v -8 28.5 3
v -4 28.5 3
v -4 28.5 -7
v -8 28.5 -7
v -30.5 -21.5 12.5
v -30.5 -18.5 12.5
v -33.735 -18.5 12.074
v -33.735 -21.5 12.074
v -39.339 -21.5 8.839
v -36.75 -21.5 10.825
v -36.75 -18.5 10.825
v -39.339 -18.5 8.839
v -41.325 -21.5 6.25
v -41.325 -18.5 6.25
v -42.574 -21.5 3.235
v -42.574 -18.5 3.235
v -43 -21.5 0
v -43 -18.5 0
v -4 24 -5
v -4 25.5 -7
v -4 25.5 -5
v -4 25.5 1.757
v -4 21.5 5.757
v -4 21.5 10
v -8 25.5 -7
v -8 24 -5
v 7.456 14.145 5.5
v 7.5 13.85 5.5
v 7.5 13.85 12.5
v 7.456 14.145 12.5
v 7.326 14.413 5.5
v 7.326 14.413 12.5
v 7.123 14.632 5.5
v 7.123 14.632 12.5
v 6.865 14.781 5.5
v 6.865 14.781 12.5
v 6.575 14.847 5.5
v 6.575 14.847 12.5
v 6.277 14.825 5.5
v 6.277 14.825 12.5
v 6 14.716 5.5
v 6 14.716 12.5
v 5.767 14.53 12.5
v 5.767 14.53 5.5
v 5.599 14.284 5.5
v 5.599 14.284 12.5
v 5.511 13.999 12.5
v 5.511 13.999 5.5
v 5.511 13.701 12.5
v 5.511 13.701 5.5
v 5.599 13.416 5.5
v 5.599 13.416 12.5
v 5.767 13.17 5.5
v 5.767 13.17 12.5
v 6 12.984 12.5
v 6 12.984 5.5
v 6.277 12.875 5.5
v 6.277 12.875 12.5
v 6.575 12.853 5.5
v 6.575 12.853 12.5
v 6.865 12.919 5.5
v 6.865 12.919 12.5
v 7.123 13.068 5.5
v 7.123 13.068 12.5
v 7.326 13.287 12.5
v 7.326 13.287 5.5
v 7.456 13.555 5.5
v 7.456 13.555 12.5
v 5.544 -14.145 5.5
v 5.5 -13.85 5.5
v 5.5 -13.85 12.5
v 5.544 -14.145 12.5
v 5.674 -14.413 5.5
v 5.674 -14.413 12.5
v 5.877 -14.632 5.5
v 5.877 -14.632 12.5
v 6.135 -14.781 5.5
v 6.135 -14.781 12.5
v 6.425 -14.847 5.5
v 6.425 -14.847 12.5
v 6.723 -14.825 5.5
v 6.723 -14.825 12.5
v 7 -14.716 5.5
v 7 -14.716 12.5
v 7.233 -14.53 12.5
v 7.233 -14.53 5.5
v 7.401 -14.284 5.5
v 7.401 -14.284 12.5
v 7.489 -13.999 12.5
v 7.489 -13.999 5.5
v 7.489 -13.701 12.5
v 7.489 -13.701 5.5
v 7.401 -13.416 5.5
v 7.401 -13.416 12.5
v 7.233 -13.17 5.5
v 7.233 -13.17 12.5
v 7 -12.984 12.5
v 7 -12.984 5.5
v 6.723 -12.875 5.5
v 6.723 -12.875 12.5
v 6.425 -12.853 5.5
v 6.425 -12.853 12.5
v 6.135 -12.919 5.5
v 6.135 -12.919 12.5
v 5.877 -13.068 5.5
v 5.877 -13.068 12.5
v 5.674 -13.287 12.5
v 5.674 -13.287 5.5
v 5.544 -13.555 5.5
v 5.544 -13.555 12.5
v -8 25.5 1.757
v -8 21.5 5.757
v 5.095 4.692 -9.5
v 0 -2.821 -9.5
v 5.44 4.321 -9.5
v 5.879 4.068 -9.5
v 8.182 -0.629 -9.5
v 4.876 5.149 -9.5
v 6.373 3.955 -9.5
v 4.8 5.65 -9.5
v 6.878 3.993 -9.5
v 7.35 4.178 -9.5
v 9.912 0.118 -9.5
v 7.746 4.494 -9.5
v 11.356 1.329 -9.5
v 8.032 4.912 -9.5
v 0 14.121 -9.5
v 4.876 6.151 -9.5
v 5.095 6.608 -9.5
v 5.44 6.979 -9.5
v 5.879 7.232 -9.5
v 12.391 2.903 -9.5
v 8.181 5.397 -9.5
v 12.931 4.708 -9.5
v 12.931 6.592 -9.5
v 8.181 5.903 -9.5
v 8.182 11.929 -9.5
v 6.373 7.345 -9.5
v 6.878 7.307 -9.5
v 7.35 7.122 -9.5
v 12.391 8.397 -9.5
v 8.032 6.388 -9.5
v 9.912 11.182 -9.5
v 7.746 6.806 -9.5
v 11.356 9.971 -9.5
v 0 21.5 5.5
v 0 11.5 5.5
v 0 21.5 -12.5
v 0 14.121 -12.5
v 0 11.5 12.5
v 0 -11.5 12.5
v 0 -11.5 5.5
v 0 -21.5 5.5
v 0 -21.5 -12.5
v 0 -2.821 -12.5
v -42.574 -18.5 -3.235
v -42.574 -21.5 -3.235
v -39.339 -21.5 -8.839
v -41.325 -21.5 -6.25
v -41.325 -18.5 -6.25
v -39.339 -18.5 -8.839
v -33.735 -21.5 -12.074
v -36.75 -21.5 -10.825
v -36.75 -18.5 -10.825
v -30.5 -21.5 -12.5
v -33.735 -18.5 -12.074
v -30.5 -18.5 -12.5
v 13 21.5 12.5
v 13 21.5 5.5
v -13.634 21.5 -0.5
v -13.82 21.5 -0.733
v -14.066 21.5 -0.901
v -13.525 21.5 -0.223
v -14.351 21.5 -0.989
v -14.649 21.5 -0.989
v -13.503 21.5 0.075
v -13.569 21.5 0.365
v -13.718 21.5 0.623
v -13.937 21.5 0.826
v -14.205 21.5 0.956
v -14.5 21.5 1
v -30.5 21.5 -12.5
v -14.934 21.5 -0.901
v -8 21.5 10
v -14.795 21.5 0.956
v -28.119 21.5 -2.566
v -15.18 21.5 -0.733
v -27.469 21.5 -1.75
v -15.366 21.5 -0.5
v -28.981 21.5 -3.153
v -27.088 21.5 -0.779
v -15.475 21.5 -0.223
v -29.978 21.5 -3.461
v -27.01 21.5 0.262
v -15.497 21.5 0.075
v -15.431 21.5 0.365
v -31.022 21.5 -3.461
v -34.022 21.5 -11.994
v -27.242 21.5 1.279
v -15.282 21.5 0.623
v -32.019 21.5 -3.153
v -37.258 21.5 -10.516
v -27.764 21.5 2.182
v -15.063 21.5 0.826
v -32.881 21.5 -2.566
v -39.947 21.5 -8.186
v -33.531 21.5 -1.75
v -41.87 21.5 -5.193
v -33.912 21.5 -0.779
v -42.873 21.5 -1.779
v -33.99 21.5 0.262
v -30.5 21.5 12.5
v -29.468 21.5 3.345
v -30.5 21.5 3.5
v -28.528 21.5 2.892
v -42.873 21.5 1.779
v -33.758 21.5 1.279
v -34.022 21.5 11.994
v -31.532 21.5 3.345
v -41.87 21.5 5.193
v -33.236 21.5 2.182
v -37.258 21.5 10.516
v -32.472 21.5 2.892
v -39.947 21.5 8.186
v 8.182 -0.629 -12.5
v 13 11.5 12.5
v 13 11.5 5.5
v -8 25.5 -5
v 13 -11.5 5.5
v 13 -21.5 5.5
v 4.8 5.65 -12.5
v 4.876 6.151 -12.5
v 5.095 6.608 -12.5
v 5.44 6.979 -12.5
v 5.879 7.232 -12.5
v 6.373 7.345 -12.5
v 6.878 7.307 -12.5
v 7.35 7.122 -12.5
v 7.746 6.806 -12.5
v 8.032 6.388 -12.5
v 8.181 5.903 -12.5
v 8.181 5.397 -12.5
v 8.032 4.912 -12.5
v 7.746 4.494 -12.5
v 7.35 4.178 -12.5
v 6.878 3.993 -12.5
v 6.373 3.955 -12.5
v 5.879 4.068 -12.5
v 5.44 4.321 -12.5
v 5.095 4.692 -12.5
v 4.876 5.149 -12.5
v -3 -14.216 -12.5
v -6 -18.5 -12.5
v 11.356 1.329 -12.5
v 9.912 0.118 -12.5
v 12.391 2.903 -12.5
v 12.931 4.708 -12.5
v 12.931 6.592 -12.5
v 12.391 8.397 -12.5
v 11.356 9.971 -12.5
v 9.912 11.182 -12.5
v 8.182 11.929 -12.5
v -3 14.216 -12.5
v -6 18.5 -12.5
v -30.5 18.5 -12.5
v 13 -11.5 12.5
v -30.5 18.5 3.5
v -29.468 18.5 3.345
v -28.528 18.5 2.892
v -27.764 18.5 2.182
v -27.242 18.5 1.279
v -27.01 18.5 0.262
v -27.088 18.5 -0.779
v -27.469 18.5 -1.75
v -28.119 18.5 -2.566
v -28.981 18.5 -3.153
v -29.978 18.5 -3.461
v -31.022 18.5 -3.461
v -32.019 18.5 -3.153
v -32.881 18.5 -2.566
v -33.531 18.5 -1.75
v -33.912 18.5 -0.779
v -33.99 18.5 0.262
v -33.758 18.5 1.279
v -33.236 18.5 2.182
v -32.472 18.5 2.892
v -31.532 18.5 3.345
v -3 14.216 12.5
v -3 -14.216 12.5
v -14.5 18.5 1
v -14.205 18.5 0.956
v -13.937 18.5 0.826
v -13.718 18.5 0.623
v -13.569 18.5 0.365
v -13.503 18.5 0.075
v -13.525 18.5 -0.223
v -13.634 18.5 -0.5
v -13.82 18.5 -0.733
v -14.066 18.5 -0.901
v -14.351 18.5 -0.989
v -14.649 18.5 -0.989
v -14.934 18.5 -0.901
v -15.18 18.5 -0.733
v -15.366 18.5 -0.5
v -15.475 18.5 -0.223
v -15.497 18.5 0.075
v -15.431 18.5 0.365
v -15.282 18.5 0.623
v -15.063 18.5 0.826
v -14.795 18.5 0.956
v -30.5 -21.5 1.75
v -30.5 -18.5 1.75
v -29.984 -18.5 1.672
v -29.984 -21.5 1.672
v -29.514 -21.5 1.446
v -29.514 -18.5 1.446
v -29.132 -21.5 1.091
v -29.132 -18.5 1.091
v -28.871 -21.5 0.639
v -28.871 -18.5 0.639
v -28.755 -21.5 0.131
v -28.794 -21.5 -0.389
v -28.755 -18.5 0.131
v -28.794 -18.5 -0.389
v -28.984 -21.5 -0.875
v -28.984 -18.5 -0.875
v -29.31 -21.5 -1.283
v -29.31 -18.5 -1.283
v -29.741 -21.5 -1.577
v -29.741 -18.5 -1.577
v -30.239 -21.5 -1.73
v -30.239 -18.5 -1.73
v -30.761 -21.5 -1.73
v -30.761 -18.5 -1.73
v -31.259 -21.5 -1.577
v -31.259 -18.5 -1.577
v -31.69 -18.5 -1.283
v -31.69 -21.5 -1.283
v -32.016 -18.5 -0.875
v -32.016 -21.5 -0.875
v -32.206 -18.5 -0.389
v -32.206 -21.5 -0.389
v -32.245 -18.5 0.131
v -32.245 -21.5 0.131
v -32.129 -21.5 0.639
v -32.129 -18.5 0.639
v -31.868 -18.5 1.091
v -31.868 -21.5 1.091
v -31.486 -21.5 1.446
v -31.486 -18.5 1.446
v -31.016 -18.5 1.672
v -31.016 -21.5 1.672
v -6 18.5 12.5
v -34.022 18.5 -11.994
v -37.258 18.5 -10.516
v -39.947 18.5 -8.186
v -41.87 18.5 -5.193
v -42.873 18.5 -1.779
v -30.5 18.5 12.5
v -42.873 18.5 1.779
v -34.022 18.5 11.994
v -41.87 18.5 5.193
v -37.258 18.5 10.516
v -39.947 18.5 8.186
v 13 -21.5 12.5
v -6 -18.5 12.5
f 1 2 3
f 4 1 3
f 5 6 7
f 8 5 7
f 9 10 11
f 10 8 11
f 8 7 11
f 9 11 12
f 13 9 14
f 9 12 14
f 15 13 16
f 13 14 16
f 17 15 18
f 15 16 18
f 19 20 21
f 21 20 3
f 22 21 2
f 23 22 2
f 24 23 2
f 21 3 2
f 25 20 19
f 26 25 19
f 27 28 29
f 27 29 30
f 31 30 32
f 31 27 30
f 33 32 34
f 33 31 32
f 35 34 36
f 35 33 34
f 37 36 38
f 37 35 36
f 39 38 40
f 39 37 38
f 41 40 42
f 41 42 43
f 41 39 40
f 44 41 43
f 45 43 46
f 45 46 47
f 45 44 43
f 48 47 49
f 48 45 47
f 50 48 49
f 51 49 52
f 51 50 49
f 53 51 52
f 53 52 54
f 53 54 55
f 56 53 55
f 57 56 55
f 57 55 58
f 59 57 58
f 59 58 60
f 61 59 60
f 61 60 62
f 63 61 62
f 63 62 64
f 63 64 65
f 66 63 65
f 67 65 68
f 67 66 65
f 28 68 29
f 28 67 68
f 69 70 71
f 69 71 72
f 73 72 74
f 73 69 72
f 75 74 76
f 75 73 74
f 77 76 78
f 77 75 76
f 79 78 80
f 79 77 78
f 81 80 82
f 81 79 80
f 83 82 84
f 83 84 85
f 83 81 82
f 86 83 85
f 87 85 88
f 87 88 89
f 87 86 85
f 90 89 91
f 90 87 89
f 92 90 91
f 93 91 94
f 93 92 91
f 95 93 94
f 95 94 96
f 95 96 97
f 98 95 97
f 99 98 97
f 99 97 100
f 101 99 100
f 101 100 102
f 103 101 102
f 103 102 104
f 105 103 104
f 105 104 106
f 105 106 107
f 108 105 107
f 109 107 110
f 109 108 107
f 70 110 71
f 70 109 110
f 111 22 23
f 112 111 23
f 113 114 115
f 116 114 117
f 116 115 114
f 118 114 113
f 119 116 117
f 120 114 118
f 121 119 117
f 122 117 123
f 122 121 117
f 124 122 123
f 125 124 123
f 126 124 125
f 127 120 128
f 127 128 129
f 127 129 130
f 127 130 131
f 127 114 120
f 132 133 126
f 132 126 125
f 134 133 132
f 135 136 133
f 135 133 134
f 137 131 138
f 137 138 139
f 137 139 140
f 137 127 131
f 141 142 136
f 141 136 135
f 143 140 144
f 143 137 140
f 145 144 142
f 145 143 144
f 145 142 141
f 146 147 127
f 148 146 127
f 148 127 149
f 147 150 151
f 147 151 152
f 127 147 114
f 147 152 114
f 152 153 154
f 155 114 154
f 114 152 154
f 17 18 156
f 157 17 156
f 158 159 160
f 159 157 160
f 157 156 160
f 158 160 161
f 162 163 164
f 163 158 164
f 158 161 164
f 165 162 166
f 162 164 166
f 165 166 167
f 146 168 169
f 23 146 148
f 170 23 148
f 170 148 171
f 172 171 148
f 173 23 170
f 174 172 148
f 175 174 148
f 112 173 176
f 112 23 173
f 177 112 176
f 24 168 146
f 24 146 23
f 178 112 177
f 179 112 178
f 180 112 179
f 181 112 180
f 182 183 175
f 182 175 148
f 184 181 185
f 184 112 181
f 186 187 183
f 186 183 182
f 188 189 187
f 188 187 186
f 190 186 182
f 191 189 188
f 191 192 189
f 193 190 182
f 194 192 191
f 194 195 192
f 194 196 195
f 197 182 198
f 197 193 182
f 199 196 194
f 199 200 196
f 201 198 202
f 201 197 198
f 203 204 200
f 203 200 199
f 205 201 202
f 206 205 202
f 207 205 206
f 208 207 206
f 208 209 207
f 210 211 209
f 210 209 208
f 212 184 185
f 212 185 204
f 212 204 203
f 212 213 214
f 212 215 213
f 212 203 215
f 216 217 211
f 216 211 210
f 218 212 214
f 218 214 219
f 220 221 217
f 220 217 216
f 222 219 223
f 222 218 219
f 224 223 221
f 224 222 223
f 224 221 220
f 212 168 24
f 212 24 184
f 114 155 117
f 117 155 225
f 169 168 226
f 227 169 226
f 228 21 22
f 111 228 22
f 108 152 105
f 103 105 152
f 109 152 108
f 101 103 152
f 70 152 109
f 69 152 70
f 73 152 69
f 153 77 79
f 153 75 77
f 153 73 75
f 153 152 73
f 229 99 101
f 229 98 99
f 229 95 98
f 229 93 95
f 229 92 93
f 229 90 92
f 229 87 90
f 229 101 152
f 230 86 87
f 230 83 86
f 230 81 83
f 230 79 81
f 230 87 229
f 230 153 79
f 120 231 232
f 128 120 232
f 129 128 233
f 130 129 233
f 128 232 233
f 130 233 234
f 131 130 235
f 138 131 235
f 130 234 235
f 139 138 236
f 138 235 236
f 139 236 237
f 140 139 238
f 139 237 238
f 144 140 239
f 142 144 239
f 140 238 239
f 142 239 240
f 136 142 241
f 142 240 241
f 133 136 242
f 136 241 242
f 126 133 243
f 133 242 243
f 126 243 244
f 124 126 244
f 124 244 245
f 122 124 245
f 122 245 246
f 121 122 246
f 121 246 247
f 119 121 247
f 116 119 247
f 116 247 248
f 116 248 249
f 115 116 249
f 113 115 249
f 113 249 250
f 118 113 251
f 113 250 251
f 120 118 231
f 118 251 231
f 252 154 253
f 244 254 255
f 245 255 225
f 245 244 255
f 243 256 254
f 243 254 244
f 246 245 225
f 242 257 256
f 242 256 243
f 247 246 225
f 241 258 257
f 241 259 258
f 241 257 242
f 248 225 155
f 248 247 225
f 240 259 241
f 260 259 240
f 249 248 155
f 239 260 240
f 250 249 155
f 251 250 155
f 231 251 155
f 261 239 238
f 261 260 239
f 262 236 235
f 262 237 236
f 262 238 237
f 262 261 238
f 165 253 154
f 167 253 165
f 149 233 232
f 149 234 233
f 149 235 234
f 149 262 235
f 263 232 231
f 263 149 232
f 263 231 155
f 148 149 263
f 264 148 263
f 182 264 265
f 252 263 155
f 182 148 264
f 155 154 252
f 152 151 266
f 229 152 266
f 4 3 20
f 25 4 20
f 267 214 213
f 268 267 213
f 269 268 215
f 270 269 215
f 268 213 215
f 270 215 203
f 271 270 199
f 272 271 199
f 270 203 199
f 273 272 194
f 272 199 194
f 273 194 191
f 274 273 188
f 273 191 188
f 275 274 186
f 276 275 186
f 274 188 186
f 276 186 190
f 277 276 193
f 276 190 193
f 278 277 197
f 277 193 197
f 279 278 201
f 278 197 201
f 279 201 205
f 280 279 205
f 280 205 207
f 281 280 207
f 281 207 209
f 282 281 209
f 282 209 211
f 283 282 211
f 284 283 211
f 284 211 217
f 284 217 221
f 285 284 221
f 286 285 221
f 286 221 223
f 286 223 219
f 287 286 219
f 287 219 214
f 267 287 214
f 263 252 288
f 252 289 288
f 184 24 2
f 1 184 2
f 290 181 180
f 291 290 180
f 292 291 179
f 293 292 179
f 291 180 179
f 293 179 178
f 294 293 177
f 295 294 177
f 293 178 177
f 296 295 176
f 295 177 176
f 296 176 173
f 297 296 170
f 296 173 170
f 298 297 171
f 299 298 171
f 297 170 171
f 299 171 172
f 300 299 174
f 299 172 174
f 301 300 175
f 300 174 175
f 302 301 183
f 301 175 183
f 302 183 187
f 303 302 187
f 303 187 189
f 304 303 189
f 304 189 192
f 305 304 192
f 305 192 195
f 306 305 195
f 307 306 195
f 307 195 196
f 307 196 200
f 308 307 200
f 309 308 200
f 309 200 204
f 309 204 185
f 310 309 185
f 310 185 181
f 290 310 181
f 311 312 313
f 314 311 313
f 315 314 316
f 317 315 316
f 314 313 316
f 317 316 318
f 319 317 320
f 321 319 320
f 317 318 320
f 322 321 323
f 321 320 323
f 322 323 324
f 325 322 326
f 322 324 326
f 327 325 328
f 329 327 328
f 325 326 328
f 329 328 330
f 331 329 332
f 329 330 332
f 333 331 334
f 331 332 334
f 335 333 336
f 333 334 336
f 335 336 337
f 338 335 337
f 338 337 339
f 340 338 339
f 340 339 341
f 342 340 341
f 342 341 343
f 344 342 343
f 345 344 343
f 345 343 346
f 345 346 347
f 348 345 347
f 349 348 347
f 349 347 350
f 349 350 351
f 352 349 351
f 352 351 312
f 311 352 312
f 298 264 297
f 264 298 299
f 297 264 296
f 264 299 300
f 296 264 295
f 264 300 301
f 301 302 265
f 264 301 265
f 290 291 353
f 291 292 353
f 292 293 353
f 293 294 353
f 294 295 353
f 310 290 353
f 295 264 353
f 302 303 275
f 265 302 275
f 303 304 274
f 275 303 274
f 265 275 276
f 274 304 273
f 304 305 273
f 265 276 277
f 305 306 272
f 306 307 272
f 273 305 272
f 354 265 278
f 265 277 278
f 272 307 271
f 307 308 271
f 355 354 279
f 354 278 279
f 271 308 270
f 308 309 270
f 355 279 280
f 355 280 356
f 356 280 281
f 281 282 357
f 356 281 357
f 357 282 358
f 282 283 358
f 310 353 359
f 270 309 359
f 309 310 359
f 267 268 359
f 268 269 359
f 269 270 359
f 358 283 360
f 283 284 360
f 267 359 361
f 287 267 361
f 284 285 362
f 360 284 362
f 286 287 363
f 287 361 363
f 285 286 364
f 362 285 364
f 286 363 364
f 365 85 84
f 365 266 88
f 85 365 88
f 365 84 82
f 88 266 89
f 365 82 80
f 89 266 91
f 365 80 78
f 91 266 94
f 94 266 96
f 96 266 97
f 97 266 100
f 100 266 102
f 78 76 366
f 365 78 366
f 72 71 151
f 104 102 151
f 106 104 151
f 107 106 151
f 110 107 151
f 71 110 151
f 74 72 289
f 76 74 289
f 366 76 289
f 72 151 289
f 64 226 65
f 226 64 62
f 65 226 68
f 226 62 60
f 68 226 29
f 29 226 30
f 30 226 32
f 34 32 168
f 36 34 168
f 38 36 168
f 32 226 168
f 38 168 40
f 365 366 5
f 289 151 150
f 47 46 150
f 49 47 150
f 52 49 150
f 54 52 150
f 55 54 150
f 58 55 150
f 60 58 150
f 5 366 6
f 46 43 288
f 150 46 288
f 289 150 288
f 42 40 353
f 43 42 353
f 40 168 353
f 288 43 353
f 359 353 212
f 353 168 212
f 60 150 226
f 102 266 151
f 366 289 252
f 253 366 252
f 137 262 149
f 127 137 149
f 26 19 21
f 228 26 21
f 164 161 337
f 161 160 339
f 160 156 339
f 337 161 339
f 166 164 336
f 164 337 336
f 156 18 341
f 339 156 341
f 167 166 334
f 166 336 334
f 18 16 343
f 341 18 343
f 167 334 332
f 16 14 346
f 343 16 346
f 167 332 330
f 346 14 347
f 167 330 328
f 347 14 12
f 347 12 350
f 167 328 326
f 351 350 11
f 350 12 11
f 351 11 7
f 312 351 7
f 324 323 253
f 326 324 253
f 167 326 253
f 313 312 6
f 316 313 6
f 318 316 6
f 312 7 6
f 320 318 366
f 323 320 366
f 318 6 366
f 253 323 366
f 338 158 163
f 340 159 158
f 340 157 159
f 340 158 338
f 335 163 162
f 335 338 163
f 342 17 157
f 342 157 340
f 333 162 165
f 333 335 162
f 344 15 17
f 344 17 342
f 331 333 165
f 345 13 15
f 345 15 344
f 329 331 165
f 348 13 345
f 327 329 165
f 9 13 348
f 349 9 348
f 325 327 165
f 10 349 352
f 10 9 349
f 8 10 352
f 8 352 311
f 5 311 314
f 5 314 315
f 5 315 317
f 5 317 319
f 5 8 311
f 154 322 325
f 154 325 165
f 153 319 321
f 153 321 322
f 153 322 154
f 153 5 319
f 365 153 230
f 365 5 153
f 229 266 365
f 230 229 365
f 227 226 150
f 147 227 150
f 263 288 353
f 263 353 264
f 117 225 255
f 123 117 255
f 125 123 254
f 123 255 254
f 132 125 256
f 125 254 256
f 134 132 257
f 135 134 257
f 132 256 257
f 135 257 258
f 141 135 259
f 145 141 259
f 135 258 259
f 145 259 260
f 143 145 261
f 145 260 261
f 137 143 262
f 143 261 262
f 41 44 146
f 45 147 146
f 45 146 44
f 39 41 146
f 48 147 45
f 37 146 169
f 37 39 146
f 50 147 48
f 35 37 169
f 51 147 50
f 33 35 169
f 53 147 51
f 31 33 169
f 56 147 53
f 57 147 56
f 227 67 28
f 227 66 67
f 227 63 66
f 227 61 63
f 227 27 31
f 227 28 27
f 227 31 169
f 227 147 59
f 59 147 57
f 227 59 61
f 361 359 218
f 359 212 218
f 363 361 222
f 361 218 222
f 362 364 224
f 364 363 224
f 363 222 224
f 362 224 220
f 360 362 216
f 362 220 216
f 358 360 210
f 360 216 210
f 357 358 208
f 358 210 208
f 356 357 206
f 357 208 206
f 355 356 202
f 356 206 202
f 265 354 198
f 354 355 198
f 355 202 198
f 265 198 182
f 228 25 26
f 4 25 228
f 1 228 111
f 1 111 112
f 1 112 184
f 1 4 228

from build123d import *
from OCP.BRepFilletAPI import BRepFilletAPI_MakeChamfer

# Parameters (mm, degrees)
ESBO_O1_R                  = 1
RESSALTO_EXTRUS_O1_DEPTH   = 12.5
ESBO_O2_R                  = 3.5
ESBO_O2_R_2                = 1
CORTE_EXTRUS_O1_DEPTH      = 15
CORTE_EXTRUS_O2_DEPTH      = 56.625983137
CORTE_EXTRUS_O2_DEPTH_BACK = 56.625983137
ESBO_O4_W                  = 13
ESBO_O4_H                  = 18
ESBO_O5_R                  = 1.7
RESSALTO_EXTRUS_O2_DEPTH   = 3
CHANFRO1_SIZE              = 3
CHANFRO1_SIZE2             = 4.28444402
ESBO_O7_R                  = 1.75
CORTE_EXTRUS_O3_DEPTH      = 10
CORTE_EXTRUS_O4_DEPTH      = 63.08260626
RESSALTO_EXTRUS_O3_START   = -4
RESSALTO_EXTRUS_O3_DEPTH   = 4


with BuildPart() as part:
    # Esboço1 → Ressalto-extrusão1 (new, symmetric)
    with BuildSketch(Plane.XY):
        Polygon((0, -21.5), (-43, -21.5), (-43, -18.5), (-3, -18.5), (-3, 18.5), (-43, 18.5), (-43, 21.5), (0, 21.5), (13, 21.5), (13, 11.5), (0, 11.5), (0, -11.5), (13, -11.5), (13, -21.5), align=None)
        with Locations((6.5, 13.85)):
            Circle(ESBO_O1_R, mode=Mode.SUBTRACT)
        with Locations((6.5, -13.85)):
            Circle(ESBO_O1_R, mode=Mode.SUBTRACT)
    extrude(amount=RESSALTO_EXTRUS_O1_DEPTH, both=True)

    # Esboço2 → Corte-extrusão1 (cut)
    with BuildSketch(Plane(origin=(0, 21.5, 0), x_dir=(1, 0, 0), z_dir=(0, 1, 0))):
        with Locations((-30.5, 0)):
            Circle(ESBO_O2_R)
        with Locations((-14.5, 0)):
            Circle(ESBO_O2_R_2)
        with BuildLine():
            Line((-30.5, 12.5), (-64.159261009, 12.5))
            Line((-64.159261009, 12.5), (-64.159261009, -12.5))
            Line((-64.159261009, -12.5), (-30.5, -12.5))
            ThreePointArc((-30.5, -12.5), (-43, 0), (-30.5, 12.5))
        make_face()
    extrude(amount=-CORTE_EXTRUS_O1_DEPTH, mode=Mode.SUBTRACT)

    # Esboço4 → Corte-extrusão2 (cut, two sides: drawn at the far end of the back side and taken through both)
    with BuildSketch(Plane(origin=(0, -11.5, 0), x_dir=(1, 0, 0), z_dir=(0, 1, 0)).offset(-CORTE_EXTRUS_O2_DEPTH_BACK)):
        with Locations((6.5, 3.5)):
            Rectangle(ESBO_O4_W, ESBO_O4_H)
    extrude(amount=CORTE_EXTRUS_O2_DEPTH + CORTE_EXTRUS_O2_DEPTH_BACK, mode=Mode.SUBTRACT)

    # Esboço5 → Ressalto-extrusão2 (add)
    with BuildSketch(Plane(origin=(0, 0, -12.5), x_dir=(-1, 0, 0), z_dir=(0, 0, -1))):
        with BuildLine():
            Line((-8.182323793, 11.928517871), (0, 14.120964923))
            Line((0, 14.120964923), (0, -2.820964923))
            Line((0, -2.820964923), (-8.182323793, -0.628517871))
            ThreePointArc((-8.182323793, -0.628517871), (-13, 5.65), (-8.182323793, 11.928517871))
        make_face()
        with Locations((-6.5, 5.65)):
            Circle(ESBO_O5_R, mode=Mode.SUBTRACT)
    extrude(amount=-RESSALTO_EXTRUS_O2_DEPTH)

    # Chanfro1: one chamfer whose edges measure the first distance from different faces: ONE call of the kernel's chamfer builder (chamfer() names one face for all edges)
    chanfro1_edges_1 = [part.edges().sort_by_distance(p)[0] for p in [
        (-3, -18.5, 0),
    ]]
    chanfro1_side_1 = [part.faces().sort_by_distance(p)[0] for p in [
        (-23, -18.5, 0),
    ]]
    chanfro1_edges_2 = [part.edges().sort_by_distance(p)[0] for p in [
        (-3, 18.5, 0),
    ]]
    chanfro1_side_2 = [part.faces().sort_by_distance(p)[0] for p in [
        (-21.411390312, 18.5, 0),
    ]]
    chanfro1 = BRepFilletAPI_MakeChamfer(part.part.solid().wrapped)
    for e in chanfro1_edges_1:
        chanfro1.Add(CHANFRO1_SIZE, CHANFRO1_SIZE2, e.wrapped, chanfro1_side_1[0].wrapped)  # the first distance lies on this face
    for e in chanfro1_edges_2:
        chanfro1.Add(CHANFRO1_SIZE, CHANFRO1_SIZE2, e.wrapped, chanfro1_side_2[0].wrapped)  # the first distance lies on this face
    add(Compound.cast(chanfro1.Shape()), mode=Mode.REPLACE)

    # Esboço7 → Corte-extrusão3 (cut)
    with BuildSketch(Plane(origin=(0, -18.5, 0), x_dir=(1, 0, 0), z_dir=(0, 1, 0))):
        with Locations((-30.5, 0)):
            Circle(ESBO_O7_R)
    extrude(amount=-CORTE_EXTRUS_O3_DEPTH, mode=Mode.SUBTRACT)

    # Esboço2<2> → Corte-extrusão4 (cut, through all)
    with BuildSketch(Plane(origin=(0, 21.5, 0), x_dir=(1, 0, 0), z_dir=(0, 1, 0))):
        with BuildLine():
            Line((-30.5, 12.5), (-64.159261009, 12.5))
            Line((-64.159261009, 12.5), (-64.159261009, -12.5))
            Line((-64.159261009, -12.5), (-30.5, -12.5))
            ThreePointArc((-30.5, -12.5), (-43, 0), (-30.5, 12.5))
        make_face()
    extrude(amount=-CORTE_EXTRUS_O4_DEPTH, mode=Mode.SUBTRACT)

    # Esboço8 → Ressalto-extrusão3 (add)
    with BuildSketch(Plane(origin=(0, 0, 0), x_dir=(0, 0, -1), z_dir=(1, 0, 0)).offset(RESSALTO_EXTRUS_O3_START)):
        Polygon((-10, 21.5), (-3, 28.5), (7, 28.5), (7, 25.5), (5, 24), (5, 25.5), (-1.757359313, 25.5), (-5.757359313, 21.5), align=None)
    extrude(amount=-RESSALTO_EXTRUS_O3_DEPTH)


solid = part.part
